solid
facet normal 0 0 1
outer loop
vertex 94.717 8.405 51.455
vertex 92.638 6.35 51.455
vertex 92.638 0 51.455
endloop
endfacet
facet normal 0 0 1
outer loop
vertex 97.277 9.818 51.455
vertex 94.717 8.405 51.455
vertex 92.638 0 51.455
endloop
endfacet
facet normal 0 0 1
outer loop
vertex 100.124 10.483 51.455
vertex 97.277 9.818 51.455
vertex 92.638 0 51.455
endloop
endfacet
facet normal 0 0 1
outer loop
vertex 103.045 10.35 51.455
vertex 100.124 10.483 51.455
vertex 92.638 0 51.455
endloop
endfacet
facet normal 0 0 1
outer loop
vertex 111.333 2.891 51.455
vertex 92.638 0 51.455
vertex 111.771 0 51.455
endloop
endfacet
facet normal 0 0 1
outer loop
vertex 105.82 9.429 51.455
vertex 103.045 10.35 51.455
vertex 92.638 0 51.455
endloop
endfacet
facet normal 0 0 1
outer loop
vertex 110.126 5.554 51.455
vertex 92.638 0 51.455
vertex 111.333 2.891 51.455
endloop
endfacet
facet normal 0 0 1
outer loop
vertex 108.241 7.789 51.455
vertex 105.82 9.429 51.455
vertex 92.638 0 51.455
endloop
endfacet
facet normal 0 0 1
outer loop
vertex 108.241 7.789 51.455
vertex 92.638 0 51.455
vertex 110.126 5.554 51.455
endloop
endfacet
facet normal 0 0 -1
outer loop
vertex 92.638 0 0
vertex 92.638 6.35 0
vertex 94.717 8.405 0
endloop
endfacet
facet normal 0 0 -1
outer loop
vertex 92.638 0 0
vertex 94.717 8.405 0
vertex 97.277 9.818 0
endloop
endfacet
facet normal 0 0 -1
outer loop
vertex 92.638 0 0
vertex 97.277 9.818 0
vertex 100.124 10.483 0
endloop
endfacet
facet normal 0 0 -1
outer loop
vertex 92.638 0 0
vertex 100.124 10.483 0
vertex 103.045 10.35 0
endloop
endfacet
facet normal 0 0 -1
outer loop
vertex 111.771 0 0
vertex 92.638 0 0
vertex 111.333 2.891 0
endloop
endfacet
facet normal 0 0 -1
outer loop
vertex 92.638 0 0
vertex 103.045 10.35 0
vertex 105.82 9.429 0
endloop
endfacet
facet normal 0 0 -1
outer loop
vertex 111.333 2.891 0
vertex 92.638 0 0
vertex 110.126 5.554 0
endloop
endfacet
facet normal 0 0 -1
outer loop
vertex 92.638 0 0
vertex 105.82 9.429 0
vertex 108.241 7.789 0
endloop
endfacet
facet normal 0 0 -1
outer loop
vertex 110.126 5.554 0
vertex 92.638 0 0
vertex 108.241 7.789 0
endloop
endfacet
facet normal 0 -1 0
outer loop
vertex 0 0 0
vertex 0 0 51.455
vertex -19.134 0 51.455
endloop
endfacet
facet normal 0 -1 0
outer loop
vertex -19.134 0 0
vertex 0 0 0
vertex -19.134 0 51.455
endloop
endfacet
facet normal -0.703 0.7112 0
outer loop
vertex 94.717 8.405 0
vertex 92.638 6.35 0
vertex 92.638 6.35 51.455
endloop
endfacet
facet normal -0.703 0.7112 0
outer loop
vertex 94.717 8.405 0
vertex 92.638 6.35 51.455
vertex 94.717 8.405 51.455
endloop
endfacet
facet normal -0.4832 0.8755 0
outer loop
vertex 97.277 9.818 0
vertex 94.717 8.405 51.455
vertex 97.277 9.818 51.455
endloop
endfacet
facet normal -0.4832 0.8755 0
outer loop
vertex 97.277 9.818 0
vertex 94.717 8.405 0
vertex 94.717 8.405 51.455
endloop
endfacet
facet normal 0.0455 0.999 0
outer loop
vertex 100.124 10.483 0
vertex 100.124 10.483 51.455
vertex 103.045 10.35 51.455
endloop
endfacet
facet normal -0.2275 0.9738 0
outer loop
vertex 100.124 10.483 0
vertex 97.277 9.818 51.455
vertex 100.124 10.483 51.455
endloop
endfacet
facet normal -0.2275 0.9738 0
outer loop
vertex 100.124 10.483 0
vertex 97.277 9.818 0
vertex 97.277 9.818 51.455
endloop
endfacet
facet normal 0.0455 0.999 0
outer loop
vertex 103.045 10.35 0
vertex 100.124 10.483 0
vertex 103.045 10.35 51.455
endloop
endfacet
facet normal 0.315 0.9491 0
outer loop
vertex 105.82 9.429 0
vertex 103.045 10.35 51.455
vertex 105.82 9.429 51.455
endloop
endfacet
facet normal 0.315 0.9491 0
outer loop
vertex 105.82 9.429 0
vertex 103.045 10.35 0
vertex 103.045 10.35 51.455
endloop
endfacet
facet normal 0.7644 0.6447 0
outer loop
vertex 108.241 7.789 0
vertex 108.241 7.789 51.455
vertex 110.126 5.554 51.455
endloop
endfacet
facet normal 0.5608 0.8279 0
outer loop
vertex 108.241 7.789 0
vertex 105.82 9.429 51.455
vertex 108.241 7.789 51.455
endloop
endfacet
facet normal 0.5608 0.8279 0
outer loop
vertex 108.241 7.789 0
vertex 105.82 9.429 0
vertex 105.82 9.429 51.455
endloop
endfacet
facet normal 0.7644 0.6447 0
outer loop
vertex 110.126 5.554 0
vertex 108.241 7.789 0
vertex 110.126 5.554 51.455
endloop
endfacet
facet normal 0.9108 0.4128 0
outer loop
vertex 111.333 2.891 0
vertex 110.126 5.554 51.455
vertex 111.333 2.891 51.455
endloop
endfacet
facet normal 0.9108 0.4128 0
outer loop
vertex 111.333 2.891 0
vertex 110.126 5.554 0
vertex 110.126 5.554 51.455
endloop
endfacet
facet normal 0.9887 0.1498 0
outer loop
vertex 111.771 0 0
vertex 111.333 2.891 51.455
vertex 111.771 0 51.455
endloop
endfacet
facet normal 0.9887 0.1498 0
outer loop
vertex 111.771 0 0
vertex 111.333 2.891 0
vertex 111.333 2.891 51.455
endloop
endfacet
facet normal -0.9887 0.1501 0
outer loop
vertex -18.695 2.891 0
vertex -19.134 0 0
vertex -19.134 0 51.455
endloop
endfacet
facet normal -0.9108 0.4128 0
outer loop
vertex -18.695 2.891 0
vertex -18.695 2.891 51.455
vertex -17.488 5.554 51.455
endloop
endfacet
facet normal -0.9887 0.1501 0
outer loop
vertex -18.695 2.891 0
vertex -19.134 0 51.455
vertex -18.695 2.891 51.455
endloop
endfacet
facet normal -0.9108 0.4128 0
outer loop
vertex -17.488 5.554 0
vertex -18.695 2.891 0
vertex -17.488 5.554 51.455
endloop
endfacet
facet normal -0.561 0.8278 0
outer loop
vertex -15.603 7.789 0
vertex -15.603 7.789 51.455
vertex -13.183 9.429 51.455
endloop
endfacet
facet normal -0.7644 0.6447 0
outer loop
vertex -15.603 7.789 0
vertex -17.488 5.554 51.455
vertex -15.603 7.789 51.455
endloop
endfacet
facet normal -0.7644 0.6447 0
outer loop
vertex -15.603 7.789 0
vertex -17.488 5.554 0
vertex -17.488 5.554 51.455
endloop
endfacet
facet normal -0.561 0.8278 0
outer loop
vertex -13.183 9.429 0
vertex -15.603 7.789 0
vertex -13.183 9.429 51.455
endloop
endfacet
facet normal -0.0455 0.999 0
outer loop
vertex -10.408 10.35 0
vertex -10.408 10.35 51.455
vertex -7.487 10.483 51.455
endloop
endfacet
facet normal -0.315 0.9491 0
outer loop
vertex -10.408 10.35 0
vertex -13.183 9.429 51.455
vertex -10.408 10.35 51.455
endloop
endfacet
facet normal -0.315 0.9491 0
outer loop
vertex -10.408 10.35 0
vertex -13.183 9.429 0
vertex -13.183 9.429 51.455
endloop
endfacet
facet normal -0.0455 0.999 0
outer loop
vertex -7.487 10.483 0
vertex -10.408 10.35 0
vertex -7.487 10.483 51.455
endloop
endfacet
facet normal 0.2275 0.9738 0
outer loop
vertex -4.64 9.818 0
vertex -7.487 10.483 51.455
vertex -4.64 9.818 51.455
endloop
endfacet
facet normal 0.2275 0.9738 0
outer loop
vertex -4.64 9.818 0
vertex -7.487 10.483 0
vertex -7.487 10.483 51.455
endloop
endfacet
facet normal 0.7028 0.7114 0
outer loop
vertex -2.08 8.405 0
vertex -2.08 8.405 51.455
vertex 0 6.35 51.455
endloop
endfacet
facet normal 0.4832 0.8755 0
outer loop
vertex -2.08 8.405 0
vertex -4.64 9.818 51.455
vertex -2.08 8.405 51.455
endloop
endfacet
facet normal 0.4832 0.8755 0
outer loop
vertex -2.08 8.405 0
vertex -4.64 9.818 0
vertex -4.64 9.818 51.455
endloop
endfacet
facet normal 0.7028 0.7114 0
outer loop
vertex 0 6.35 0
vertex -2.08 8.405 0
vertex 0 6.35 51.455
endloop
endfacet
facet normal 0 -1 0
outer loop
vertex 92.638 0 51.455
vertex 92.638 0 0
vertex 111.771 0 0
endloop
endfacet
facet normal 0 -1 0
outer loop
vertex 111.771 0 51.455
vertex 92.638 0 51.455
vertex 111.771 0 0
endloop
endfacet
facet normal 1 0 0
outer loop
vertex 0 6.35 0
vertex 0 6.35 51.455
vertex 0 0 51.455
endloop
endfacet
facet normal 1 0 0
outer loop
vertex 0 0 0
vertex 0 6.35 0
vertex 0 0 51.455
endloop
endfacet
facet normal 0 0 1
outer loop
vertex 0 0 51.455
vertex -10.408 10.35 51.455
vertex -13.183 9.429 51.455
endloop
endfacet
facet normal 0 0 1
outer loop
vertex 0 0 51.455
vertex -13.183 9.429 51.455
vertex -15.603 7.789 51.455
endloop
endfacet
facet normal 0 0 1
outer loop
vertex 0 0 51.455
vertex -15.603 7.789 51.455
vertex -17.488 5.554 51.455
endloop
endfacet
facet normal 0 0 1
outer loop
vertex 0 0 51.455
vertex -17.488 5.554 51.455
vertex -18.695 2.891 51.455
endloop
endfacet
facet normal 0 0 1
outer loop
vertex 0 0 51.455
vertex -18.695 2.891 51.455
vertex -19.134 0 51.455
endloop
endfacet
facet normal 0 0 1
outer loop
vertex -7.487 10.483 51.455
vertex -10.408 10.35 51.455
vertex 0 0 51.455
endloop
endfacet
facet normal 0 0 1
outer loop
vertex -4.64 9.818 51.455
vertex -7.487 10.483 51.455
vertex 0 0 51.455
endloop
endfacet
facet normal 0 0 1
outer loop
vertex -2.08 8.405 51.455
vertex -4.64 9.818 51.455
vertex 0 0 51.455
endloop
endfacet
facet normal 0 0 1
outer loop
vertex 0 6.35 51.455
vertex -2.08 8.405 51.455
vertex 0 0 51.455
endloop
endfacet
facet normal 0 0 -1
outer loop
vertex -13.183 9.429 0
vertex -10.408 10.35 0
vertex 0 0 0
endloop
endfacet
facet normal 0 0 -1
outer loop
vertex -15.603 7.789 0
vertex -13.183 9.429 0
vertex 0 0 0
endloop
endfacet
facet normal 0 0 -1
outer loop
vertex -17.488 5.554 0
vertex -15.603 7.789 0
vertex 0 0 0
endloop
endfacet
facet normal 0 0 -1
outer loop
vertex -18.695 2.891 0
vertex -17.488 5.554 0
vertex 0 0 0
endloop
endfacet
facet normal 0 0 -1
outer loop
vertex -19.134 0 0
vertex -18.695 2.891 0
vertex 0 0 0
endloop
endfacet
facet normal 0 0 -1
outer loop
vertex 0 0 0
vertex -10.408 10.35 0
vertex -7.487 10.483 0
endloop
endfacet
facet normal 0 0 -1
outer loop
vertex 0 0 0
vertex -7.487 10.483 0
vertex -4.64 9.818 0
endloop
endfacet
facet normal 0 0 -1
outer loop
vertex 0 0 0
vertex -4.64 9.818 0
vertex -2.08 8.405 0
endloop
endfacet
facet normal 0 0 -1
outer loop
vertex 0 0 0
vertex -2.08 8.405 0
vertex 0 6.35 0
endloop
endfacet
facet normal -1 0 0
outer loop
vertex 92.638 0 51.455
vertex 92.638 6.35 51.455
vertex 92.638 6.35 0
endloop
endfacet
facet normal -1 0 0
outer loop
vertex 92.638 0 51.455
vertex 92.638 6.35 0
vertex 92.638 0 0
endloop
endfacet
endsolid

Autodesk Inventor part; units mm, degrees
ref_plane "YZ Plane" through (0, 0, 0) normal (1, 0, 0) x (0, 1, 0)
ref_plane "XZ Plane" through (0, 0, 0) normal (0, 1, 0) x (-1, 0, 0)
sketch "Sketch1" plane through (0, 0, 0) normal (0, 0, 1) x (1, 0, 0)
  arc A0 (0, 6.35) -> (-19.1337, 0) centre (-8.4667, -0.1401) ccw projected
  line L0 (0, 0) -> (-19.1337, 0) projected
  line L1 (0, 6.35) -> (0, 0) projected
  line L2 (92.6375, 6.35) -> (92.6375, 0) projected
  line L3 (92.6375, 0) -> (111.7712, 0) projected
  arc A1 (111.7712, 0) -> (92.6375, 6.35) centre (101.1041, -0.1401) ccw projected
ref_plane "Work Plane1" through (-19.1337, 0, 51.4547) normal (0, 0, -1) x (0, 1, 0)
extrude "Extrusion1" add sketch "Sketch1" along normal up to surface (51.4547 mm away)
properties part number "Bad PillarS"
